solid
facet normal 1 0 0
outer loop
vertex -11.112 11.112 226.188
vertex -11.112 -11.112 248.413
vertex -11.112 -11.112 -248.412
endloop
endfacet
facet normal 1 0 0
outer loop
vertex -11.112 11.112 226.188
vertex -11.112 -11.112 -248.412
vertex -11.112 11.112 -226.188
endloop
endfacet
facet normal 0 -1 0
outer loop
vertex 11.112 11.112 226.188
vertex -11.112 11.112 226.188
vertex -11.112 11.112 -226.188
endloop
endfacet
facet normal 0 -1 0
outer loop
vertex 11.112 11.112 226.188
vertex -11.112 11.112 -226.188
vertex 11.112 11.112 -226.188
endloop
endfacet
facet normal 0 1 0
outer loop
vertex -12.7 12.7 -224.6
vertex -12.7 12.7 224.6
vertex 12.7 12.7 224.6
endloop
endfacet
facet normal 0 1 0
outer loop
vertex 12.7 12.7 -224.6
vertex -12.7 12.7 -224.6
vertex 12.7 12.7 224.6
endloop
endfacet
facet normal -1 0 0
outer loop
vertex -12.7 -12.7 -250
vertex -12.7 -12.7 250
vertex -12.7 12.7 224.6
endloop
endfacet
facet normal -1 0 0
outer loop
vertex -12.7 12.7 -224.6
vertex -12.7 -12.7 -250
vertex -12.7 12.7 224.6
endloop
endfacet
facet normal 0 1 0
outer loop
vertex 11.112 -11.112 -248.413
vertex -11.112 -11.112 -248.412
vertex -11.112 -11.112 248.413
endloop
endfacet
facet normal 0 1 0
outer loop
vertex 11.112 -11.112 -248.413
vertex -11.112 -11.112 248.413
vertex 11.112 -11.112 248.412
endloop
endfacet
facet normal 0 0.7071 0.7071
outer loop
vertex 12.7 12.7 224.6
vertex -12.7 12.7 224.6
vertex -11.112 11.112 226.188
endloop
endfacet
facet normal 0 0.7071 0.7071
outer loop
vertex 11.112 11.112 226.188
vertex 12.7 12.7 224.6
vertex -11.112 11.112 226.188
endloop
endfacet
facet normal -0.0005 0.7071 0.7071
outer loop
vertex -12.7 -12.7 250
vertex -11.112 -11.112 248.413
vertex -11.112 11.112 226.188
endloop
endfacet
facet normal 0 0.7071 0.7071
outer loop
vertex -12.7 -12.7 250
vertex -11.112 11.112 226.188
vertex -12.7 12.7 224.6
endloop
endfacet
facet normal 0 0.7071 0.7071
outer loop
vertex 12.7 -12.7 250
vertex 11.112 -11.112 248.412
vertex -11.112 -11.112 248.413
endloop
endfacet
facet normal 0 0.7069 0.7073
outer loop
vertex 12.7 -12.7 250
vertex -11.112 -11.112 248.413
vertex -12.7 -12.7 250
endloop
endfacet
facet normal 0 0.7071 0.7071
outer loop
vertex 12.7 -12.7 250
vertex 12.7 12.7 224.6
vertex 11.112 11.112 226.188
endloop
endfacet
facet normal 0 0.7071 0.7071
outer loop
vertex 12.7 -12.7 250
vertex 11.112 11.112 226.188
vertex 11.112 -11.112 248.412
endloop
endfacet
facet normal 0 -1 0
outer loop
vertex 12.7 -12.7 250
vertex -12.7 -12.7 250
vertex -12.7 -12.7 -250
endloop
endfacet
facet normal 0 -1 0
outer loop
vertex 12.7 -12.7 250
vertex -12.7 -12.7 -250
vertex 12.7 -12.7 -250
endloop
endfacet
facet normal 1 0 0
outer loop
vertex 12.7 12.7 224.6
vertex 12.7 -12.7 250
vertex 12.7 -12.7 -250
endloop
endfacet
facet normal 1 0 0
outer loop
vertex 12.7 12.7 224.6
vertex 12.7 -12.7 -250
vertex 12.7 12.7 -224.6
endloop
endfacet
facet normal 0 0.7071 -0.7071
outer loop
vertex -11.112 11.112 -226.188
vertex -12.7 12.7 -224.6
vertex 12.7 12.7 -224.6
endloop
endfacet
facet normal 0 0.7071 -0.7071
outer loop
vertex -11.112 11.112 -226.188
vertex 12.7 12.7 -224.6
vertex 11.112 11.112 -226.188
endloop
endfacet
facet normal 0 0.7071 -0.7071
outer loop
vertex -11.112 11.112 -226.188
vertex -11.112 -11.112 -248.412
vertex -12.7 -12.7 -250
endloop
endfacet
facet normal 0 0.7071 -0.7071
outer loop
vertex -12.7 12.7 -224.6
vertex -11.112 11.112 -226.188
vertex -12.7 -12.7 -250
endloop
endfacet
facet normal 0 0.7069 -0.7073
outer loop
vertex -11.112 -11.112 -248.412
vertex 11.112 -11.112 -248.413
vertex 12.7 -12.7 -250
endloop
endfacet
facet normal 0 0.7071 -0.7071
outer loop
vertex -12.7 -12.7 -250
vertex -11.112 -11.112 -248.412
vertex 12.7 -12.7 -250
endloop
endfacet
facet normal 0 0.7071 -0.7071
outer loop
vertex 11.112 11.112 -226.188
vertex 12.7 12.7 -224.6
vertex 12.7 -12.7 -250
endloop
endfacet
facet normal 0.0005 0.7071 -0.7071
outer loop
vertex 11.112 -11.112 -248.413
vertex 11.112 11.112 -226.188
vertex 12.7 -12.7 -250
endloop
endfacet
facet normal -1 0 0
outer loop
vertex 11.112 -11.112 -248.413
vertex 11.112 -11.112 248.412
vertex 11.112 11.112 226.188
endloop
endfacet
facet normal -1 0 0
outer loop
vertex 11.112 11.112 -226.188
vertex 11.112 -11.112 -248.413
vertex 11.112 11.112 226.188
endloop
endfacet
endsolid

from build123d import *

# Parameters (mm, degrees)
SKETCH1_W           = 25.4
SKETCH1_H           = 25.4
SKETCH1_W_2         = 22.225
SKETCH1_H_2         = 22.225
BOSS_EXTRUDE1_DEPTH = 250
CUT_EXTRUDE1_DEPTH  = 252.607730406


with BuildPart() as part:
    # Sketch1 → Boss-Extrude1 (new, symmetric)
    with BuildSketch(Plane.XY):
        Rectangle(SKETCH1_W, SKETCH1_H)
        Rectangle(SKETCH1_W_2, SKETCH1_H_2, mode=Mode.SUBTRACT)
    extrude(amount=BOSS_EXTRUDE1_DEPTH, both=True)

    # Sketch2 → Cut-Extrude1 (cut, through all)
    with BuildSketch(Plane(origin=(12.7, 0, 0), x_dir=(0, 0, -1), z_dir=(1, 0, 0))):
        Polygon((-250, -12.7), (-250, 12.7), (-224.6, 12.7), align=None)
        Polygon((250, -12.7), (250, 12.7), (224.6, 12.7), align=None)
    extrude(amount=-CUT_EXTRUDE1_DEPTH, mode=Mode.SUBTRACT)


solid = part.part
